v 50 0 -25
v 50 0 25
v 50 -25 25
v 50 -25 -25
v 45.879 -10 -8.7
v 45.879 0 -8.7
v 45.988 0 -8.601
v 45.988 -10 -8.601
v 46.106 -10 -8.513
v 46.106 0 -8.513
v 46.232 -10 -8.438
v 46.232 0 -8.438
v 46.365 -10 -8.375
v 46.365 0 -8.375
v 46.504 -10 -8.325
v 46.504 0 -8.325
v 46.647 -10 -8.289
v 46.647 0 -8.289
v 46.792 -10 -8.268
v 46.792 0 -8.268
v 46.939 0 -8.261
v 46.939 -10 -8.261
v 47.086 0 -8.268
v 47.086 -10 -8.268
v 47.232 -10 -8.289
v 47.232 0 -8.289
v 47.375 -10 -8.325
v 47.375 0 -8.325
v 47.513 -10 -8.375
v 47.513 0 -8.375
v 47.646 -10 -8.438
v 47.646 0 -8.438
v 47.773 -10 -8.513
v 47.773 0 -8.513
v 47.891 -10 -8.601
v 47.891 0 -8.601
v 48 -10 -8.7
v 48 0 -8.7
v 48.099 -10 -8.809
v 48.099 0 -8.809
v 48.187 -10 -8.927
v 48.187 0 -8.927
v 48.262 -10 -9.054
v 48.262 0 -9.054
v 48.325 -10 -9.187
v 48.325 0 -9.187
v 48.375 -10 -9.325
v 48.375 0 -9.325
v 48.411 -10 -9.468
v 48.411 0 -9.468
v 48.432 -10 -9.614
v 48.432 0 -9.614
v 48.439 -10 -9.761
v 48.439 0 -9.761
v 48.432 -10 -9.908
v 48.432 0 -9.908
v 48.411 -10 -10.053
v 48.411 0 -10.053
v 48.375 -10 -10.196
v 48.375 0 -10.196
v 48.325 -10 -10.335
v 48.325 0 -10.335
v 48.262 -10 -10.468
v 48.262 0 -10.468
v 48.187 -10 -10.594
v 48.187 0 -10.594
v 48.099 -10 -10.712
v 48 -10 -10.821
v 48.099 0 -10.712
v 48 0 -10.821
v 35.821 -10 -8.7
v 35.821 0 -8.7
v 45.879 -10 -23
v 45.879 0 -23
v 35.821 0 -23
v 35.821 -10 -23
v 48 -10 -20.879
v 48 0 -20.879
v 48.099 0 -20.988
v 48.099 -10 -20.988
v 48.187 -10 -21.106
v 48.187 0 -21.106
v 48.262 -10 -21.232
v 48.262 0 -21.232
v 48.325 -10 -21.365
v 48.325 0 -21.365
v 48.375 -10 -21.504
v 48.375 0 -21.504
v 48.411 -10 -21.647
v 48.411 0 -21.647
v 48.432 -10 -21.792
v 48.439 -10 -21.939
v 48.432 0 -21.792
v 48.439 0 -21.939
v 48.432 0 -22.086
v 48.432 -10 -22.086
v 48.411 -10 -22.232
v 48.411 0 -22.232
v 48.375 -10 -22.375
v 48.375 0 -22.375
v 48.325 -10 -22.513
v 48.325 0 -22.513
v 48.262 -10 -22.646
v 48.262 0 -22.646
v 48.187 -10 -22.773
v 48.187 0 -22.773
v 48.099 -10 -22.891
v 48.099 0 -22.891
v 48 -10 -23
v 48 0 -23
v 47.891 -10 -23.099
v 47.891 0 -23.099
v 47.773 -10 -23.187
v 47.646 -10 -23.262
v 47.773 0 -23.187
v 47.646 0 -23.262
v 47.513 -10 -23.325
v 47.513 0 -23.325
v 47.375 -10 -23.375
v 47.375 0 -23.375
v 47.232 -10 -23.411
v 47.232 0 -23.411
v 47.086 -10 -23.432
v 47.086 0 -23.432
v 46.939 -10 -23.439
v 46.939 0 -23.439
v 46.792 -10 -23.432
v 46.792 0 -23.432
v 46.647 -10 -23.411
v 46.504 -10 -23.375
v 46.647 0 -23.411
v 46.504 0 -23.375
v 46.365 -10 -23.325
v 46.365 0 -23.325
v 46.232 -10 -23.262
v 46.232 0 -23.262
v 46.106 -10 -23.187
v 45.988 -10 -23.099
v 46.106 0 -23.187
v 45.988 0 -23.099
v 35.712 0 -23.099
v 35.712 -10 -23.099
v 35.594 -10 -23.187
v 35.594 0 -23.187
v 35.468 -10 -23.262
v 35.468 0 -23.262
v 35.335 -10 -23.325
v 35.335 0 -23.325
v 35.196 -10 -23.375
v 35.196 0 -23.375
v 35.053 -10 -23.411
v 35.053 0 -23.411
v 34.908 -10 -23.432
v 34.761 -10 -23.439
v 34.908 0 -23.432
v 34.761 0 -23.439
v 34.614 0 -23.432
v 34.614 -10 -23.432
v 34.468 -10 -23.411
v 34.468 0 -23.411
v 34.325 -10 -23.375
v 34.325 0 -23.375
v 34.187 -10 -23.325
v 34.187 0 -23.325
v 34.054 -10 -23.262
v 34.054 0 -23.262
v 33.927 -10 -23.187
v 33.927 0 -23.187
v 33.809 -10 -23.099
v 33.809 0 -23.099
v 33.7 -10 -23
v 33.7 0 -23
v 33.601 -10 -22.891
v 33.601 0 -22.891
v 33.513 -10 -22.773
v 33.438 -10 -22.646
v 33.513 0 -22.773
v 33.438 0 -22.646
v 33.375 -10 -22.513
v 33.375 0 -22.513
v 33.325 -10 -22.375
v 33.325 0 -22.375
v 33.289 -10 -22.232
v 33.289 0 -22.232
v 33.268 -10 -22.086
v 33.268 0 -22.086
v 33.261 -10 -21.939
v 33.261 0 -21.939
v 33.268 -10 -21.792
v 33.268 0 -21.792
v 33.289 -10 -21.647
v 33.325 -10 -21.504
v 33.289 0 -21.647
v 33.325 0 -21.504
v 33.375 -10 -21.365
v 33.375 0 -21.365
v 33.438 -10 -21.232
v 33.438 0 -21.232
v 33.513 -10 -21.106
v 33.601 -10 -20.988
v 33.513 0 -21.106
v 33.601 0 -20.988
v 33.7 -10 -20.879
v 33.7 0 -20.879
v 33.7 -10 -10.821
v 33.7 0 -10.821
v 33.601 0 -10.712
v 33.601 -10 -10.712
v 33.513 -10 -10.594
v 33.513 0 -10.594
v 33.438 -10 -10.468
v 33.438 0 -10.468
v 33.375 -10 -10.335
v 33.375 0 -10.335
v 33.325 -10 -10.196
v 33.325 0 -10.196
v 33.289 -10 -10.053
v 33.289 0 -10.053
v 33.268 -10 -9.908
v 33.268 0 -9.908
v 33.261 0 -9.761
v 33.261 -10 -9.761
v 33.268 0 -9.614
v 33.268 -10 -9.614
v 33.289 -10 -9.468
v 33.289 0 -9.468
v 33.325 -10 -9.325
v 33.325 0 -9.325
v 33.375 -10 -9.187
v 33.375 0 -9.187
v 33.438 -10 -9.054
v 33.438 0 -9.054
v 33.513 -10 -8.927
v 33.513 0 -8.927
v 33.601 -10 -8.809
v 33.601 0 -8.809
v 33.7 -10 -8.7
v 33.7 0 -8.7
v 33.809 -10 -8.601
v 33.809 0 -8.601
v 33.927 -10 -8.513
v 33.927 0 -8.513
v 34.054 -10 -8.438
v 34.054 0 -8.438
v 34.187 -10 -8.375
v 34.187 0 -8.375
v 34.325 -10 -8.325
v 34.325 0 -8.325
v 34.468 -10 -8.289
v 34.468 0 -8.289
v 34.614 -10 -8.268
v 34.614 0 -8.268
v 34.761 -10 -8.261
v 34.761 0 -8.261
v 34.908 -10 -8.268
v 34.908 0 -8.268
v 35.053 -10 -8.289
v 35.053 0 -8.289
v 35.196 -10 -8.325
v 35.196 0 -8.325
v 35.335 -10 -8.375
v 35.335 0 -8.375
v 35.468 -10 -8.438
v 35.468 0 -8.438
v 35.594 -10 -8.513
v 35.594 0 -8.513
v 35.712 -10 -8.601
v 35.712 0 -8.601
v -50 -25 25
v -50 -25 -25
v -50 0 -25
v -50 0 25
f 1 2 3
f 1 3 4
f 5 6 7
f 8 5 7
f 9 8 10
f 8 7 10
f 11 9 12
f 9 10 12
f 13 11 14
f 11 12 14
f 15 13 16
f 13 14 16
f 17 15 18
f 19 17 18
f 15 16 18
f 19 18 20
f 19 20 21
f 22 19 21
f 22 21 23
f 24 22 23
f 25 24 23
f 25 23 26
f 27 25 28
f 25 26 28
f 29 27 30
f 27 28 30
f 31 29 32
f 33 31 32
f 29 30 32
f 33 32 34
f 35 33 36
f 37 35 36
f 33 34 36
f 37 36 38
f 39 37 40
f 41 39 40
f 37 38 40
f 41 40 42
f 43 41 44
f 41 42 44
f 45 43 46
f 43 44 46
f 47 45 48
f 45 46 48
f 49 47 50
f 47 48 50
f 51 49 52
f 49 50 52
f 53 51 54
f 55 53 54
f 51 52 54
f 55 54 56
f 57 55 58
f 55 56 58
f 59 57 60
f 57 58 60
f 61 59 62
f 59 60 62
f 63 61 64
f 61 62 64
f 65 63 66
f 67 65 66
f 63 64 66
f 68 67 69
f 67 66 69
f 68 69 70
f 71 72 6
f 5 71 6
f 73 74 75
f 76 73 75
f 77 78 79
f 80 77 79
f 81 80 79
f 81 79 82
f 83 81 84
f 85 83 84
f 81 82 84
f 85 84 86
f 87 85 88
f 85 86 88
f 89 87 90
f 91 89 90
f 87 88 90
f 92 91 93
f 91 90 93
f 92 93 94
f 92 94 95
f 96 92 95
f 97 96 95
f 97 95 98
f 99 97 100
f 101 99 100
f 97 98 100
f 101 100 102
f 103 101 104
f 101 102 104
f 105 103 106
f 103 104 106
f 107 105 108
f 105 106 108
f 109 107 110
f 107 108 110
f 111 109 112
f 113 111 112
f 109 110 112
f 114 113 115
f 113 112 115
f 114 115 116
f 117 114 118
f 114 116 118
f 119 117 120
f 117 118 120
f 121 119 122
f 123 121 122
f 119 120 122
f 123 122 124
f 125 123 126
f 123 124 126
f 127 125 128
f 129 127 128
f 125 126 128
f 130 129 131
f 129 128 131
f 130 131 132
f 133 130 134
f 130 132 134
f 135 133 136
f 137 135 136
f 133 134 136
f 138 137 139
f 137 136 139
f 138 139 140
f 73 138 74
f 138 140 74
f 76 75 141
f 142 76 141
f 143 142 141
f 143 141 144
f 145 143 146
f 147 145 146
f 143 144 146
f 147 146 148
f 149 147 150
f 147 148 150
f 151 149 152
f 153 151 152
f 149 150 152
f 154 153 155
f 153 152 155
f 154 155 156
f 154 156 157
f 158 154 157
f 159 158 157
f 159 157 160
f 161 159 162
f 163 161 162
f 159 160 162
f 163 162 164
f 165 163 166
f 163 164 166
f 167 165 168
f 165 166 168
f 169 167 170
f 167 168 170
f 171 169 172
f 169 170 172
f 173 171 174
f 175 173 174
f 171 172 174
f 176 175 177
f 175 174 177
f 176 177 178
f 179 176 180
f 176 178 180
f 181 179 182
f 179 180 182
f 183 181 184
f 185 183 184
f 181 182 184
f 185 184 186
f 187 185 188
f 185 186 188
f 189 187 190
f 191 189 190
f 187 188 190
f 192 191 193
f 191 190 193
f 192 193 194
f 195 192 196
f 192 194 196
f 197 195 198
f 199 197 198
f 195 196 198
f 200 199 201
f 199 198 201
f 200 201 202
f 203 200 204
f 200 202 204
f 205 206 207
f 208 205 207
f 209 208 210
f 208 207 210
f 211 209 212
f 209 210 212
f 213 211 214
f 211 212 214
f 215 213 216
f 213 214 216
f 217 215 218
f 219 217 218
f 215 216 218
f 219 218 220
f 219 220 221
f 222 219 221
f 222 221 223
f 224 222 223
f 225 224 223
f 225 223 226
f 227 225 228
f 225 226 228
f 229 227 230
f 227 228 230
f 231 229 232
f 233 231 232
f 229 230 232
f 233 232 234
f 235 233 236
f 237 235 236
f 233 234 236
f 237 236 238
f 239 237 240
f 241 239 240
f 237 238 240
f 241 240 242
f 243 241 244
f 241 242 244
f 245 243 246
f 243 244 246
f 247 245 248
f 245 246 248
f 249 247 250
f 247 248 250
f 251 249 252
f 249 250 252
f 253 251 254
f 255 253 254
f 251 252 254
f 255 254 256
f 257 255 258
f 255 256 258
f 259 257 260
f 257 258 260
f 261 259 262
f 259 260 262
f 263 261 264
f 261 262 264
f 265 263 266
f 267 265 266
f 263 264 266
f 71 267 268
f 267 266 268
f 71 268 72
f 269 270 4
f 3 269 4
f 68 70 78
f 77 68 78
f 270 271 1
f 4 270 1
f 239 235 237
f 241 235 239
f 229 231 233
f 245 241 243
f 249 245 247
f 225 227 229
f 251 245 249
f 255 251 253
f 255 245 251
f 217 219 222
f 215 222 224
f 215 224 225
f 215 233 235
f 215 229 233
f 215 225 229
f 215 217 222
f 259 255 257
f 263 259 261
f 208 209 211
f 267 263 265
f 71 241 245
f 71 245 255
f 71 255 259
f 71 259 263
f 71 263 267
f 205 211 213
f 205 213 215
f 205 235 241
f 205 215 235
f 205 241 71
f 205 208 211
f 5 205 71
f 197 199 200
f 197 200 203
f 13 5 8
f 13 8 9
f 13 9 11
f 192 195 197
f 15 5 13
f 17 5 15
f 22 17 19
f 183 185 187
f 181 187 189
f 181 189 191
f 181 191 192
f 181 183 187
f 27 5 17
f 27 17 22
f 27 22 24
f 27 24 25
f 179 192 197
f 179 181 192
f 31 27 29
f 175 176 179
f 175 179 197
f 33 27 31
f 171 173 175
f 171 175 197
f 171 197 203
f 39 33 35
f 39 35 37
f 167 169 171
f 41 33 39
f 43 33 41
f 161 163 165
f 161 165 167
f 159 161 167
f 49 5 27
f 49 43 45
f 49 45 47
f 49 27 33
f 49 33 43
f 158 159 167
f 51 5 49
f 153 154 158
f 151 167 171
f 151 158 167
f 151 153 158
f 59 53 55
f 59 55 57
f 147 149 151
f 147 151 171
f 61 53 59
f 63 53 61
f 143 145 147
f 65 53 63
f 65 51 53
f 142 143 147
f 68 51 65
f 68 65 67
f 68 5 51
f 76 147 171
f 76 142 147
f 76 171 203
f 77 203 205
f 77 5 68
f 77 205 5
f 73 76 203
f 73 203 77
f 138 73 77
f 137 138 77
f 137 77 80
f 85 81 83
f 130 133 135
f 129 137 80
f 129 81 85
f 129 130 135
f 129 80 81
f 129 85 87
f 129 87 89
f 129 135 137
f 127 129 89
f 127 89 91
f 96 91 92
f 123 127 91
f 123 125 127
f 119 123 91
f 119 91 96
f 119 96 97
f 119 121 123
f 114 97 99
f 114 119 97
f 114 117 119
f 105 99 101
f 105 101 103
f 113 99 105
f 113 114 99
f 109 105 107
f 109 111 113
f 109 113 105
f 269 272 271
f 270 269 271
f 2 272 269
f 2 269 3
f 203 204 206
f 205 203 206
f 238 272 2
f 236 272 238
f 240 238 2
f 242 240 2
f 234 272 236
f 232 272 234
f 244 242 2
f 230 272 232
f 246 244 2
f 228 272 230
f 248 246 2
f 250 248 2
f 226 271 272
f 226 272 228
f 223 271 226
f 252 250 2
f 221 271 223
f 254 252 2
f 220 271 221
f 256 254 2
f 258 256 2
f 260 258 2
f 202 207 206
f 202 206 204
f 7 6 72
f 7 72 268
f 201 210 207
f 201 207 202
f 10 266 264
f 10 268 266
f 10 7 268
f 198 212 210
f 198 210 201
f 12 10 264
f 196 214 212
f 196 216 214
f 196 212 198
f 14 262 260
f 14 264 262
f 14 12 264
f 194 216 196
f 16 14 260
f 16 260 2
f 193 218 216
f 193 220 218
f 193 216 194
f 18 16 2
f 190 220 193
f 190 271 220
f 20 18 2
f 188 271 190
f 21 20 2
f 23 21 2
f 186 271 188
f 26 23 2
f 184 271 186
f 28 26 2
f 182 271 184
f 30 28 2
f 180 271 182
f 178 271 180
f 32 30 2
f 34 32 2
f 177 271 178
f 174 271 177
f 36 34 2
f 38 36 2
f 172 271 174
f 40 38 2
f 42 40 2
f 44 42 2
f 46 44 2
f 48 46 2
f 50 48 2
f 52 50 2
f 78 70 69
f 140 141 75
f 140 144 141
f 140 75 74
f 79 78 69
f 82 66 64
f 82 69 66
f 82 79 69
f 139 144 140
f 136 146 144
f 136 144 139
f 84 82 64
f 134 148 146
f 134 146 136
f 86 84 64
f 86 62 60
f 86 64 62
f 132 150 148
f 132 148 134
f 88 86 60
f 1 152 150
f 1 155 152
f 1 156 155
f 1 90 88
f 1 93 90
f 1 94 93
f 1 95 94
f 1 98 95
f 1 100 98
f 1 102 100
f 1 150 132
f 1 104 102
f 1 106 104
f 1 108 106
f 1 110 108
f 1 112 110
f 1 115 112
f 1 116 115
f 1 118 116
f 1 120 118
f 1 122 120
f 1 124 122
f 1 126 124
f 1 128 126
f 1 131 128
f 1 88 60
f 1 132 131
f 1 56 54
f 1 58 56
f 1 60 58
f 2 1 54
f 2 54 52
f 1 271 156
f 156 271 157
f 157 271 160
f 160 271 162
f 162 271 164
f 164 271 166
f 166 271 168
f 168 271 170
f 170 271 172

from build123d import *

# Parameters (mm, degrees)
SKETCH1_W           = 100
SKETCH1_H           = 50
BOSS_EXTRUDE1_DEPTH = 25
CUT_EXTRUDE1_DEPTH  = 10


with BuildPart() as part:
    # Sketch1 → Boss-Extrude1 (new body)
    with BuildSketch(Plane(origin=(0, 0, 0), x_dir=(1, 0, 0), z_dir=(0, 1, 0))):
        Rectangle(SKETCH1_W, SKETCH1_H)
    extrude(amount=-BOSS_EXTRUDE1_DEPTH)

    # Sketch2 → Cut-Extrude1 (cut)
    with BuildSketch(Plane(origin=(0, 0, 0), x_dir=(1, 0, 0), z_dir=(0, 1, 0))):
        with BuildLine():
            Line((33.7, 20.878679656), (33.7, 10.821320344))
            ThreePointArc((33.7, 10.821320344), (33.7, 8.7), (35.821320344, 8.7))
            Line((35.821320344, 8.7), (45.878679656, 8.7))
            ThreePointArc((45.878679656, 8.7), (48, 8.7), (48, 10.821320344))
            Line((48, 10.821320344), (48, 20.878679656))
            ThreePointArc((48, 20.878679656), (48, 23), (45.878679656, 23))
            Line((45.878679656, 23), (35.821320344, 23))
            ThreePointArc((35.821320344, 23), (33.7, 23), (33.7, 20.878679656))
        make_face()
    extrude(amount=-CUT_EXTRUDE1_DEPTH, mode=Mode.SUBTRACT)


solid = part.part
